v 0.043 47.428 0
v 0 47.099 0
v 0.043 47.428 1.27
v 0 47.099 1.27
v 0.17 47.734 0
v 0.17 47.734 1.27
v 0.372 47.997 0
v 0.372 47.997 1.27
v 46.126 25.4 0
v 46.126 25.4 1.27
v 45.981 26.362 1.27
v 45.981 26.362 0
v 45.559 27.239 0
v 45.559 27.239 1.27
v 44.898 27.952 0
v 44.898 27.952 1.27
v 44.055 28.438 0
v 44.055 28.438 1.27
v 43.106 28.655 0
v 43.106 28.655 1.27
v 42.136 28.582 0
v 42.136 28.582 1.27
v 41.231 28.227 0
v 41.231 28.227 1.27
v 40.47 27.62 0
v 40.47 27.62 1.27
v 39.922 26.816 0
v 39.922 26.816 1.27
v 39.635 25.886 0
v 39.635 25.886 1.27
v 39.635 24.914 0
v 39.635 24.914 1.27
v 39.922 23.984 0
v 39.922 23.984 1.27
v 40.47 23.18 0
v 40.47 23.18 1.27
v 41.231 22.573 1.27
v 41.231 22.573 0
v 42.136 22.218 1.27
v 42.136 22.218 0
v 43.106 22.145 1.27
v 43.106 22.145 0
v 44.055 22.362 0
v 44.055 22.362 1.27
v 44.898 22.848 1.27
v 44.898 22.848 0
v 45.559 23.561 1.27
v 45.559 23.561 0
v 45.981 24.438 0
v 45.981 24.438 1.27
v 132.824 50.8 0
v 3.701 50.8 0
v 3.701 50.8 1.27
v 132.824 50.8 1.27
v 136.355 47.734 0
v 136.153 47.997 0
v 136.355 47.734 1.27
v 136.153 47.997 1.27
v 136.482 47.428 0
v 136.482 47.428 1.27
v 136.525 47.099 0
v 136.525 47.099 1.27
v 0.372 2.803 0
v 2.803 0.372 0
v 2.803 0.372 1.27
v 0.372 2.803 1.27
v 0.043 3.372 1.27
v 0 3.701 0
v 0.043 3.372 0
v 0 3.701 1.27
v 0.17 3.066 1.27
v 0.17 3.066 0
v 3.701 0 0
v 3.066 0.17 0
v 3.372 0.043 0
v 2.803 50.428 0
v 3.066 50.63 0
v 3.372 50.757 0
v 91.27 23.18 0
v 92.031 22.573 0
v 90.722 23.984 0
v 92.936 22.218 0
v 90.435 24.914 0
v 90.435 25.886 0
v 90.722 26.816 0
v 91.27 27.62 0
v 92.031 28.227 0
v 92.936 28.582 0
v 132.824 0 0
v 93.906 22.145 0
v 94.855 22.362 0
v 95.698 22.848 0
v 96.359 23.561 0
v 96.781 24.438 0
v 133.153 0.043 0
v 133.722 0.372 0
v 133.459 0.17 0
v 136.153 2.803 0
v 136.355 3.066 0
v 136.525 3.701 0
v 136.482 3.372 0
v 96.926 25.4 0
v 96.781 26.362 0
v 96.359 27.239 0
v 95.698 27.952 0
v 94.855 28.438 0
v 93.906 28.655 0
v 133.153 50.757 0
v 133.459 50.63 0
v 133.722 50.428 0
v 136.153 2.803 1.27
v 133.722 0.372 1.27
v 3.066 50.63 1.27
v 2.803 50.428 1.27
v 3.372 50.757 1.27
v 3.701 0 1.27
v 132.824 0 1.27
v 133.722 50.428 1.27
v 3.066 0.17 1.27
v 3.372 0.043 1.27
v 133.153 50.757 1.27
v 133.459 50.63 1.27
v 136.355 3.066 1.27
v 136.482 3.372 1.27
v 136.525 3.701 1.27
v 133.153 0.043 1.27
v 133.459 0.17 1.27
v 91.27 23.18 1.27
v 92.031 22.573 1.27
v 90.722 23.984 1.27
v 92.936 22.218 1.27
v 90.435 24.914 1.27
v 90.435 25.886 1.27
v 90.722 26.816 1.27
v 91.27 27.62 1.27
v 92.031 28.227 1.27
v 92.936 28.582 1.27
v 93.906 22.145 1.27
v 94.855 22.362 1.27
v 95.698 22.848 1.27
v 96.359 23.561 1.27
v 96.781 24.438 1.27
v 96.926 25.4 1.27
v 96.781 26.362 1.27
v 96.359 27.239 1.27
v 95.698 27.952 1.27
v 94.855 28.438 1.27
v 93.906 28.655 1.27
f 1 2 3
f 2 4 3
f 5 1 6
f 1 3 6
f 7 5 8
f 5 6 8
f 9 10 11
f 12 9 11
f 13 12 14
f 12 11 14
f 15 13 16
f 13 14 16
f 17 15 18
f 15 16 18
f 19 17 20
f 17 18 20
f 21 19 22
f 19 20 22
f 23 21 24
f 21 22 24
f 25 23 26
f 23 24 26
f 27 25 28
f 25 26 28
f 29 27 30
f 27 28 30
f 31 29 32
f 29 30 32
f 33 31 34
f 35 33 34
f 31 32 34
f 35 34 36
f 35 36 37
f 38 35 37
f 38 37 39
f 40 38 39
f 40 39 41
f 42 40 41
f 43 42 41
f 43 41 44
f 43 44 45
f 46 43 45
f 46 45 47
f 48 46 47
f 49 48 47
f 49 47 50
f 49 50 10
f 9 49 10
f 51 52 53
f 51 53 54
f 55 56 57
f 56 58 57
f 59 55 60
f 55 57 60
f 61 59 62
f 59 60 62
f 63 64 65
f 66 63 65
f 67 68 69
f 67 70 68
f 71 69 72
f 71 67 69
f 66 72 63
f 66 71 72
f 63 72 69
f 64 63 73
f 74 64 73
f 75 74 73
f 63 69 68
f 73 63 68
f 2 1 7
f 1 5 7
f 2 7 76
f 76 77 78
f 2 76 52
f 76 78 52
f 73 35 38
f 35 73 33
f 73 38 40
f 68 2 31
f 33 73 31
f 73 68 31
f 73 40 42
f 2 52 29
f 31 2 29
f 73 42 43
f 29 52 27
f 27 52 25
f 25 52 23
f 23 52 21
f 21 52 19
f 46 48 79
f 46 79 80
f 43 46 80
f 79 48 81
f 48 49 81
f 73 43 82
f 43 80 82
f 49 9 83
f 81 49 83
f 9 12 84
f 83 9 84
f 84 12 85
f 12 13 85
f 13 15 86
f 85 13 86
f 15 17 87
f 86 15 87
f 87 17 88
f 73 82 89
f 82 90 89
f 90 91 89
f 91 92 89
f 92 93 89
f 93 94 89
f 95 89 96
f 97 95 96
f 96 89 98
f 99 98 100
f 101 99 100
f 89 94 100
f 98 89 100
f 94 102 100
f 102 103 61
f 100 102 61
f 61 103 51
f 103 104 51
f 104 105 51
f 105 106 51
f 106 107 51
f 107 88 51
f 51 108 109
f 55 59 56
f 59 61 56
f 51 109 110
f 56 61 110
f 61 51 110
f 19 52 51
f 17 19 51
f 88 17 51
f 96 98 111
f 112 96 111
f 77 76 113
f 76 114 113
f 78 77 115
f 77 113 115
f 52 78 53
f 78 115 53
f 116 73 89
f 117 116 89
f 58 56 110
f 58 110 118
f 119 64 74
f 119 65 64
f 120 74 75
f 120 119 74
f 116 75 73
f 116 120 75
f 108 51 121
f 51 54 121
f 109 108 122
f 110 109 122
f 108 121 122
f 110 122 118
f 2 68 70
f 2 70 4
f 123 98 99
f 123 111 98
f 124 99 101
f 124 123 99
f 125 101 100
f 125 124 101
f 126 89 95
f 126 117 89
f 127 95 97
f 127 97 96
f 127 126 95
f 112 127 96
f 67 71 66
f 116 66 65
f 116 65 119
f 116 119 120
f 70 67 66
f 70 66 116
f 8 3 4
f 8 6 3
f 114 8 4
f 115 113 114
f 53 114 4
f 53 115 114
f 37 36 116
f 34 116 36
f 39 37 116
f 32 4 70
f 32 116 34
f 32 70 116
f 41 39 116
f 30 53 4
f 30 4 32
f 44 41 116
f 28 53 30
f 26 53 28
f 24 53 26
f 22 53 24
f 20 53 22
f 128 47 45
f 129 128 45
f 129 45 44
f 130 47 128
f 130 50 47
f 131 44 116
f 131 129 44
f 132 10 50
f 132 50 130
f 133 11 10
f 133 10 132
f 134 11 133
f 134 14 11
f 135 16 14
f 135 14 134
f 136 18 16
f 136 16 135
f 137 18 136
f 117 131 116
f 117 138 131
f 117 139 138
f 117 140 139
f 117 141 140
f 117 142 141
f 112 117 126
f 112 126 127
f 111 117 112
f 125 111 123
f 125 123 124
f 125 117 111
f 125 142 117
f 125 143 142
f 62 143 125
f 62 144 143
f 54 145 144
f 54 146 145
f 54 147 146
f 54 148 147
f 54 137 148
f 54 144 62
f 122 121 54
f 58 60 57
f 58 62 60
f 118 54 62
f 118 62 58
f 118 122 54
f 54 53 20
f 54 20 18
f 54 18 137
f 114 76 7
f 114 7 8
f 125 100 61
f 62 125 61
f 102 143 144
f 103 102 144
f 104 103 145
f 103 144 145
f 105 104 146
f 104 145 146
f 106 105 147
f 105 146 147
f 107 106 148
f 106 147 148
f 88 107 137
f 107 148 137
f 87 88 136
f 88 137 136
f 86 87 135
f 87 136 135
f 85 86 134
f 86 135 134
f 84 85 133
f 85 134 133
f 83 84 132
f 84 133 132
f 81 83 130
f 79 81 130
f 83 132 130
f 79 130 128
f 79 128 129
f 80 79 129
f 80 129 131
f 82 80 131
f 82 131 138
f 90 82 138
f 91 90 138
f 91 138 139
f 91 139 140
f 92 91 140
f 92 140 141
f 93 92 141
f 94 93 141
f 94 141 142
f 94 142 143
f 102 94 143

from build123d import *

# Parameters (mm, degrees)
SKETCH1_W           = 136.525
SKETCH1_H           = 50.8
BOSS_EXTRUDE1_DEPTH = 1.27
SKETCH3_R           = 3.2639
CUT_EXTRUDE1_DEPTH  = 2.27
CHAMFER1_SIZE       = 3.175
FILLET1_R           = 1.27


with BuildPart() as part:
    # Sketch1 → Boss-Extrude1 (new body)
    with BuildSketch(Plane.XY):
        with Locations((68.2625, 25.4)):
            Rectangle(SKETCH1_W, SKETCH1_H)
    extrude(amount=BOSS_EXTRUDE1_DEPTH)

    # Sketch3 → Cut-Extrude1 (cut, through all)
    with BuildSketch(Plane.XY.offset(1.27)):
        with Locations((93.6625, 25.4)):
            Circle(SKETCH3_R)
        with Locations((42.8625, 25.4)):
            Circle(SKETCH3_R)
    extrude(amount=-CUT_EXTRUDE1_DEPTH, mode=Mode.SUBTRACT)

    # Chamfer1
    chamfer1_edges = [part.edges().sort_by_distance(p)[0] for p in [
        (0, 0, 0.635),
        (0, 50.8, 0.635),
        (136.525, 50.8, 0.635),
        (136.525, 0, 0.635),
    ]]
    chamfer(chamfer1_edges, length=CHAMFER1_SIZE)

    # Fillet1
    fillet1_edges = [part.edges().sort_by_distance(p)[0] for p in [
        (133.35, 0, 0.635),
        (3.175, 0, 0.635),
        (0, 47.625, 0.635),
        (0, 3.175, 0.635),
        (133.35, 50.8, 0.635),
        (3.175, 50.8, 0.635),
        (136.525, 3.175, 0.635),
        (136.525, 47.625, 0.635),
    ]]
    fillet(fillet1_edges, radius=FILLET1_R)


solid = part.part
